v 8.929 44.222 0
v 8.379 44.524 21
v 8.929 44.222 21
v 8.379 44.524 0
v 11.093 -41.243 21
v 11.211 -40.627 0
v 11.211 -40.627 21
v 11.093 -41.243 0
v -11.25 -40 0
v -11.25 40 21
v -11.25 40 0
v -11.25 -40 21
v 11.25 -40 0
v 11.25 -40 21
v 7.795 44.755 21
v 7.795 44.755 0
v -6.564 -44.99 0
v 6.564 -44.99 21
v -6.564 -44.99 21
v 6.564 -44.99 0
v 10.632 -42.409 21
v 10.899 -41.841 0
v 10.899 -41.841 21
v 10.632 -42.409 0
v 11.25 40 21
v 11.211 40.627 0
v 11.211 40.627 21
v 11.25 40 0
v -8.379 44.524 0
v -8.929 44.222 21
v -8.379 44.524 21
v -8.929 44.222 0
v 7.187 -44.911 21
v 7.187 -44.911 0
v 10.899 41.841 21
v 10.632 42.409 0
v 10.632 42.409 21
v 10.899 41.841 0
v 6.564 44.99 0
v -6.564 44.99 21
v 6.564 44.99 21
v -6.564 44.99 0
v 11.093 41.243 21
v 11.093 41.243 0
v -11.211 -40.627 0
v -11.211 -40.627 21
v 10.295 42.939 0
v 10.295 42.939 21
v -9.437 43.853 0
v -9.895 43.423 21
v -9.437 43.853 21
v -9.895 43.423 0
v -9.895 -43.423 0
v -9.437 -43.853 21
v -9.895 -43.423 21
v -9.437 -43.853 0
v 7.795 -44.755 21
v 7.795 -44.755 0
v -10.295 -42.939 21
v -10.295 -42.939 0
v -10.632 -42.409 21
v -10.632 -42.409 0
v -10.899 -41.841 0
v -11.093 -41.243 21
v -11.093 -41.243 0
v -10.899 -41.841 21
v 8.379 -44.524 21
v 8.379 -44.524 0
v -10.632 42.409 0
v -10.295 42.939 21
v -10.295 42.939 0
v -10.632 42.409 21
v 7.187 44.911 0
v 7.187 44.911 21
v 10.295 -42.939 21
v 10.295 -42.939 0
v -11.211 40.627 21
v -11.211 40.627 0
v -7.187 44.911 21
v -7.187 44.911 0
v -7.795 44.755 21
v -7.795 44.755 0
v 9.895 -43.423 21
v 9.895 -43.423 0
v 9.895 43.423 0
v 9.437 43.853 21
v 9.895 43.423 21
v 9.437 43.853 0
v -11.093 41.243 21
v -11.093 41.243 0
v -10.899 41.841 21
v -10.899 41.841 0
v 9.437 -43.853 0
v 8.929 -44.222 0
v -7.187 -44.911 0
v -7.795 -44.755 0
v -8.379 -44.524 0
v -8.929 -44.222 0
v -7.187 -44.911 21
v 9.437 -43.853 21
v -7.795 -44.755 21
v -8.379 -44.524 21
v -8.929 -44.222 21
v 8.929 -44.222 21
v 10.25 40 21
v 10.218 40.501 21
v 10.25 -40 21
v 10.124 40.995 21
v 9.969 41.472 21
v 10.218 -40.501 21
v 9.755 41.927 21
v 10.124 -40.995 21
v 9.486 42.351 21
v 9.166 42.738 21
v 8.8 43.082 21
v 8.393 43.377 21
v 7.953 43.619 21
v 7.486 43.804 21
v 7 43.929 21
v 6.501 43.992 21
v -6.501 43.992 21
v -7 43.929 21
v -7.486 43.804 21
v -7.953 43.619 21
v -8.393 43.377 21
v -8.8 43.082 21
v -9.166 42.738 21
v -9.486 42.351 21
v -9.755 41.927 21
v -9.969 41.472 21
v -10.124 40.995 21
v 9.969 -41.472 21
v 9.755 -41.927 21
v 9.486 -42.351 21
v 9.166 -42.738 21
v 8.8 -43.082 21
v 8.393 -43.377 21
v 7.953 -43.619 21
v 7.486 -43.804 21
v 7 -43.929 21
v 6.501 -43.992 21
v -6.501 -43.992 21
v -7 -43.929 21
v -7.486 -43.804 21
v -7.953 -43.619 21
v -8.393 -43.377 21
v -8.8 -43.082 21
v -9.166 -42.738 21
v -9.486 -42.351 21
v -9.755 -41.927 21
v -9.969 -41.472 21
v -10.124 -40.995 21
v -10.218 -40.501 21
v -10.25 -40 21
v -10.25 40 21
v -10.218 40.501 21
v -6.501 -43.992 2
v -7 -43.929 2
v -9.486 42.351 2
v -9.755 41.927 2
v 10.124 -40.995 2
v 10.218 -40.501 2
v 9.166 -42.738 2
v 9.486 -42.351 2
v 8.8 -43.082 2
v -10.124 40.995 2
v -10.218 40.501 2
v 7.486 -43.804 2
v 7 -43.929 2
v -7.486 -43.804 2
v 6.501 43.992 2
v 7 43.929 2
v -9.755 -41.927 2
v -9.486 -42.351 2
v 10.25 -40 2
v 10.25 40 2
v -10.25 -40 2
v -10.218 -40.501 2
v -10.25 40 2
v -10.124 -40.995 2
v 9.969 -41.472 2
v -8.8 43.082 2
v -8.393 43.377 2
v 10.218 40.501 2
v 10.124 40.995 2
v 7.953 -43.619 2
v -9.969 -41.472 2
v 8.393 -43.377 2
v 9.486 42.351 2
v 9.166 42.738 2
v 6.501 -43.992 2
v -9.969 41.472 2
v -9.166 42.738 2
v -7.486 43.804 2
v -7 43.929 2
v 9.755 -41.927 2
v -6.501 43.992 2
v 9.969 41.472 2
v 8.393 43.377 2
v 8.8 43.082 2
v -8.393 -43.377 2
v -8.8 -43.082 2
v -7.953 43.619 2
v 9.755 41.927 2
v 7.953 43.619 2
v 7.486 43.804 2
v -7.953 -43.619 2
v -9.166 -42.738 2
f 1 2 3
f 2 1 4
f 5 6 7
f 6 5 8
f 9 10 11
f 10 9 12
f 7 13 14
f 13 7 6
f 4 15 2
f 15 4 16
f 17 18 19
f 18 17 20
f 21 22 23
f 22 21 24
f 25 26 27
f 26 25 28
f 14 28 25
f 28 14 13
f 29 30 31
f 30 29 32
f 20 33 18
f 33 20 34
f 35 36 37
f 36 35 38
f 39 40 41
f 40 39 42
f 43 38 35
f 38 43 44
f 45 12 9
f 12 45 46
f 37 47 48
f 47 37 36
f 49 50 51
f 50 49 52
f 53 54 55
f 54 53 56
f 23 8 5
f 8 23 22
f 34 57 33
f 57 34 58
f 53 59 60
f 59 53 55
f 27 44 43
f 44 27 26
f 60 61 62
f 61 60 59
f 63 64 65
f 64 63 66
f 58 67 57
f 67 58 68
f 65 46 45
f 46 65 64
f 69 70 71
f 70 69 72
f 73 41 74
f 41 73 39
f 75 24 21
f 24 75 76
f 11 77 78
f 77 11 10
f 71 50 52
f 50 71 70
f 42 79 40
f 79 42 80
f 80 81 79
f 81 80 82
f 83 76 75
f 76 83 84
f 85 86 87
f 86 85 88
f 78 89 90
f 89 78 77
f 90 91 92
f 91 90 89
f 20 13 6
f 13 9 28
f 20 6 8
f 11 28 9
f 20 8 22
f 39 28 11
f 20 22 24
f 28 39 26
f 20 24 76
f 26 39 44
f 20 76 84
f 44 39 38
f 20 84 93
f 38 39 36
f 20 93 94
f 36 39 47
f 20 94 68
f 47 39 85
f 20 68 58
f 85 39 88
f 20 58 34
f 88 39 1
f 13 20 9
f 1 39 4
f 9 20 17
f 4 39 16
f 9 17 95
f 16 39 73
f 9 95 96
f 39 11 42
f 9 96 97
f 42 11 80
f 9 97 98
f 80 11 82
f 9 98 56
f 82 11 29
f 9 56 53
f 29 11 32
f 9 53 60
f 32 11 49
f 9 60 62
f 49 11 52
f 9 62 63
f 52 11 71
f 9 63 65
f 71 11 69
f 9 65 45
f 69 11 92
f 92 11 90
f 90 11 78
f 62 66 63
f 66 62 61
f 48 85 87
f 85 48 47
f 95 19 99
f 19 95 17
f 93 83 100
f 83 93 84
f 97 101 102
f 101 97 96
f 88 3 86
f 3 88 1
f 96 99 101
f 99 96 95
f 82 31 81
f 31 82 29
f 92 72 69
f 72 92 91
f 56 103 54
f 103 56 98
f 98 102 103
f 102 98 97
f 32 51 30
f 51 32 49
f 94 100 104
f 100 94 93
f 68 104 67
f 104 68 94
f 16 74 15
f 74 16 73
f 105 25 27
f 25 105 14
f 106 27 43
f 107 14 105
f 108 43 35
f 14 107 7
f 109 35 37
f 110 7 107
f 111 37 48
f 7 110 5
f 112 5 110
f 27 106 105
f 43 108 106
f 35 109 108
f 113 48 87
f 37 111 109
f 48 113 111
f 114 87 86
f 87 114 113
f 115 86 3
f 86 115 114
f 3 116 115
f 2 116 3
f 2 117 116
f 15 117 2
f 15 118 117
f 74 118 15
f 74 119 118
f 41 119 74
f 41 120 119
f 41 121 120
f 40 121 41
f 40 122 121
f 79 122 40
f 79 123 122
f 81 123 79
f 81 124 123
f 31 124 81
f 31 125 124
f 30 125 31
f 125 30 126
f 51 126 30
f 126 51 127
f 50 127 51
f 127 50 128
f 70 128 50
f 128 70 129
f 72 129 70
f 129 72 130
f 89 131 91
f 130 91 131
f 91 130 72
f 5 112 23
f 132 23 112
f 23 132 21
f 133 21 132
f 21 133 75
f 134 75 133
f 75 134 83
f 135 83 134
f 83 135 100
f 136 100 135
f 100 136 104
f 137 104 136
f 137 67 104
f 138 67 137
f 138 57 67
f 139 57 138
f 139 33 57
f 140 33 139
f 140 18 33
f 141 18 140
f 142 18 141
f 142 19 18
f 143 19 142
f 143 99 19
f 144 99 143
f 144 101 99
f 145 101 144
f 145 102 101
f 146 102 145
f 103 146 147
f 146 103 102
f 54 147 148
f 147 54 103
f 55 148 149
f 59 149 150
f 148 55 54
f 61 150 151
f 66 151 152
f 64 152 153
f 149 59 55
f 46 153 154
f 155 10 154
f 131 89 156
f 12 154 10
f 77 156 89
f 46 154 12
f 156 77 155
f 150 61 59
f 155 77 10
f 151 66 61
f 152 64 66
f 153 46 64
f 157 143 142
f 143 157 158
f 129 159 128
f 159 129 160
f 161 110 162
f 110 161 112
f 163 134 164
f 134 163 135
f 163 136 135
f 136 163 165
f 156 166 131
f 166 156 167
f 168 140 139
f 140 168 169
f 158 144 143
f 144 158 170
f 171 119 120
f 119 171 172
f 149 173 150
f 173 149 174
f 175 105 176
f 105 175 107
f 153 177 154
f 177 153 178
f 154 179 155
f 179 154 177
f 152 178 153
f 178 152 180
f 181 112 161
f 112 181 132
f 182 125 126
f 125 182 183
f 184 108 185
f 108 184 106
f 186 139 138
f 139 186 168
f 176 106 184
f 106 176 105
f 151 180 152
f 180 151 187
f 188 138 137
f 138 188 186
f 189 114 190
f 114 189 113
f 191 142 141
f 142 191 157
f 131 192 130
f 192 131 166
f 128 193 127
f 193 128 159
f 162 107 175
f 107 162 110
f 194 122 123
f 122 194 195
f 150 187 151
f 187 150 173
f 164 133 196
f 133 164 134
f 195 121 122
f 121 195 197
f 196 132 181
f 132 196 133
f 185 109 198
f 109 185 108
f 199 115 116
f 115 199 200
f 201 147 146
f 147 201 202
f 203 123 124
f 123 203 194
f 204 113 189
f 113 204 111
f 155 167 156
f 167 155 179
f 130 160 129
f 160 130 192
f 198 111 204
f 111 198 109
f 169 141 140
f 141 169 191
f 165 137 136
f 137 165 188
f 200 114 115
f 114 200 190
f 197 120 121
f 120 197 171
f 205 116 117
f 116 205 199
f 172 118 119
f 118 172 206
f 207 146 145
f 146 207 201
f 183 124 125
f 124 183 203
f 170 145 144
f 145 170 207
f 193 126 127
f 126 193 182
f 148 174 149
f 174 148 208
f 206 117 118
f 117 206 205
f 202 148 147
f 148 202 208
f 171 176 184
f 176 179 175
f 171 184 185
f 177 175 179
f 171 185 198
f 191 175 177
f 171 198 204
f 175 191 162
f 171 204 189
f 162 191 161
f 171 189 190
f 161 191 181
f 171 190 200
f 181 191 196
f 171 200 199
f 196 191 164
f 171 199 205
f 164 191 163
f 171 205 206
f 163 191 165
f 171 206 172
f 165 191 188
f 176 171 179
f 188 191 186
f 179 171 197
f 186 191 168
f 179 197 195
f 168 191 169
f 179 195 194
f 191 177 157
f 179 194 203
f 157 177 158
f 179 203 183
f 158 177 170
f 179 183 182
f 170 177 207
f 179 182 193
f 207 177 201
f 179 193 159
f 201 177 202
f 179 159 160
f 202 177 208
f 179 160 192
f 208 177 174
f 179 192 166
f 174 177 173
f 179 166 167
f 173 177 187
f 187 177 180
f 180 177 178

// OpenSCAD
$fn = 50;


difference() {
	union() {
		hull() {
			translate(v = [-6.2500000000, 40.0000000000, 0]) {
				cylinder(h = 21, r = 5);
			}
			translate(v = [6.2500000000, 40.0000000000, 0]) {
				cylinder(h = 21, r = 5);
			}
			translate(v = [-6.2500000000, -40.0000000000, 0]) {
				cylinder(h = 21, r = 5);
			}
			translate(v = [6.2500000000, -40.0000000000, 0]) {
				cylinder(h = 21, r = 5);
			}
		}
	}
	union() {
		translate(v = [0, 0, 2]) {
			hull() {
				translate(v = [-6.2500000000, 40.0000000000, 0]) {
					cylinder(h = 19, r = 4);
				}
				translate(v = [6.2500000000, 40.0000000000, 0]) {
					cylinder(h = 19, r = 4);
				}
				translate(v = [-6.2500000000, -40.0000000000, 0]) {
					cylinder(h = 19, r = 4);
				}
				translate(v = [6.2500000000, -40.0000000000, 0]) {
					cylinder(h = 19, r = 4);
				}
			}
		}
	}
}
